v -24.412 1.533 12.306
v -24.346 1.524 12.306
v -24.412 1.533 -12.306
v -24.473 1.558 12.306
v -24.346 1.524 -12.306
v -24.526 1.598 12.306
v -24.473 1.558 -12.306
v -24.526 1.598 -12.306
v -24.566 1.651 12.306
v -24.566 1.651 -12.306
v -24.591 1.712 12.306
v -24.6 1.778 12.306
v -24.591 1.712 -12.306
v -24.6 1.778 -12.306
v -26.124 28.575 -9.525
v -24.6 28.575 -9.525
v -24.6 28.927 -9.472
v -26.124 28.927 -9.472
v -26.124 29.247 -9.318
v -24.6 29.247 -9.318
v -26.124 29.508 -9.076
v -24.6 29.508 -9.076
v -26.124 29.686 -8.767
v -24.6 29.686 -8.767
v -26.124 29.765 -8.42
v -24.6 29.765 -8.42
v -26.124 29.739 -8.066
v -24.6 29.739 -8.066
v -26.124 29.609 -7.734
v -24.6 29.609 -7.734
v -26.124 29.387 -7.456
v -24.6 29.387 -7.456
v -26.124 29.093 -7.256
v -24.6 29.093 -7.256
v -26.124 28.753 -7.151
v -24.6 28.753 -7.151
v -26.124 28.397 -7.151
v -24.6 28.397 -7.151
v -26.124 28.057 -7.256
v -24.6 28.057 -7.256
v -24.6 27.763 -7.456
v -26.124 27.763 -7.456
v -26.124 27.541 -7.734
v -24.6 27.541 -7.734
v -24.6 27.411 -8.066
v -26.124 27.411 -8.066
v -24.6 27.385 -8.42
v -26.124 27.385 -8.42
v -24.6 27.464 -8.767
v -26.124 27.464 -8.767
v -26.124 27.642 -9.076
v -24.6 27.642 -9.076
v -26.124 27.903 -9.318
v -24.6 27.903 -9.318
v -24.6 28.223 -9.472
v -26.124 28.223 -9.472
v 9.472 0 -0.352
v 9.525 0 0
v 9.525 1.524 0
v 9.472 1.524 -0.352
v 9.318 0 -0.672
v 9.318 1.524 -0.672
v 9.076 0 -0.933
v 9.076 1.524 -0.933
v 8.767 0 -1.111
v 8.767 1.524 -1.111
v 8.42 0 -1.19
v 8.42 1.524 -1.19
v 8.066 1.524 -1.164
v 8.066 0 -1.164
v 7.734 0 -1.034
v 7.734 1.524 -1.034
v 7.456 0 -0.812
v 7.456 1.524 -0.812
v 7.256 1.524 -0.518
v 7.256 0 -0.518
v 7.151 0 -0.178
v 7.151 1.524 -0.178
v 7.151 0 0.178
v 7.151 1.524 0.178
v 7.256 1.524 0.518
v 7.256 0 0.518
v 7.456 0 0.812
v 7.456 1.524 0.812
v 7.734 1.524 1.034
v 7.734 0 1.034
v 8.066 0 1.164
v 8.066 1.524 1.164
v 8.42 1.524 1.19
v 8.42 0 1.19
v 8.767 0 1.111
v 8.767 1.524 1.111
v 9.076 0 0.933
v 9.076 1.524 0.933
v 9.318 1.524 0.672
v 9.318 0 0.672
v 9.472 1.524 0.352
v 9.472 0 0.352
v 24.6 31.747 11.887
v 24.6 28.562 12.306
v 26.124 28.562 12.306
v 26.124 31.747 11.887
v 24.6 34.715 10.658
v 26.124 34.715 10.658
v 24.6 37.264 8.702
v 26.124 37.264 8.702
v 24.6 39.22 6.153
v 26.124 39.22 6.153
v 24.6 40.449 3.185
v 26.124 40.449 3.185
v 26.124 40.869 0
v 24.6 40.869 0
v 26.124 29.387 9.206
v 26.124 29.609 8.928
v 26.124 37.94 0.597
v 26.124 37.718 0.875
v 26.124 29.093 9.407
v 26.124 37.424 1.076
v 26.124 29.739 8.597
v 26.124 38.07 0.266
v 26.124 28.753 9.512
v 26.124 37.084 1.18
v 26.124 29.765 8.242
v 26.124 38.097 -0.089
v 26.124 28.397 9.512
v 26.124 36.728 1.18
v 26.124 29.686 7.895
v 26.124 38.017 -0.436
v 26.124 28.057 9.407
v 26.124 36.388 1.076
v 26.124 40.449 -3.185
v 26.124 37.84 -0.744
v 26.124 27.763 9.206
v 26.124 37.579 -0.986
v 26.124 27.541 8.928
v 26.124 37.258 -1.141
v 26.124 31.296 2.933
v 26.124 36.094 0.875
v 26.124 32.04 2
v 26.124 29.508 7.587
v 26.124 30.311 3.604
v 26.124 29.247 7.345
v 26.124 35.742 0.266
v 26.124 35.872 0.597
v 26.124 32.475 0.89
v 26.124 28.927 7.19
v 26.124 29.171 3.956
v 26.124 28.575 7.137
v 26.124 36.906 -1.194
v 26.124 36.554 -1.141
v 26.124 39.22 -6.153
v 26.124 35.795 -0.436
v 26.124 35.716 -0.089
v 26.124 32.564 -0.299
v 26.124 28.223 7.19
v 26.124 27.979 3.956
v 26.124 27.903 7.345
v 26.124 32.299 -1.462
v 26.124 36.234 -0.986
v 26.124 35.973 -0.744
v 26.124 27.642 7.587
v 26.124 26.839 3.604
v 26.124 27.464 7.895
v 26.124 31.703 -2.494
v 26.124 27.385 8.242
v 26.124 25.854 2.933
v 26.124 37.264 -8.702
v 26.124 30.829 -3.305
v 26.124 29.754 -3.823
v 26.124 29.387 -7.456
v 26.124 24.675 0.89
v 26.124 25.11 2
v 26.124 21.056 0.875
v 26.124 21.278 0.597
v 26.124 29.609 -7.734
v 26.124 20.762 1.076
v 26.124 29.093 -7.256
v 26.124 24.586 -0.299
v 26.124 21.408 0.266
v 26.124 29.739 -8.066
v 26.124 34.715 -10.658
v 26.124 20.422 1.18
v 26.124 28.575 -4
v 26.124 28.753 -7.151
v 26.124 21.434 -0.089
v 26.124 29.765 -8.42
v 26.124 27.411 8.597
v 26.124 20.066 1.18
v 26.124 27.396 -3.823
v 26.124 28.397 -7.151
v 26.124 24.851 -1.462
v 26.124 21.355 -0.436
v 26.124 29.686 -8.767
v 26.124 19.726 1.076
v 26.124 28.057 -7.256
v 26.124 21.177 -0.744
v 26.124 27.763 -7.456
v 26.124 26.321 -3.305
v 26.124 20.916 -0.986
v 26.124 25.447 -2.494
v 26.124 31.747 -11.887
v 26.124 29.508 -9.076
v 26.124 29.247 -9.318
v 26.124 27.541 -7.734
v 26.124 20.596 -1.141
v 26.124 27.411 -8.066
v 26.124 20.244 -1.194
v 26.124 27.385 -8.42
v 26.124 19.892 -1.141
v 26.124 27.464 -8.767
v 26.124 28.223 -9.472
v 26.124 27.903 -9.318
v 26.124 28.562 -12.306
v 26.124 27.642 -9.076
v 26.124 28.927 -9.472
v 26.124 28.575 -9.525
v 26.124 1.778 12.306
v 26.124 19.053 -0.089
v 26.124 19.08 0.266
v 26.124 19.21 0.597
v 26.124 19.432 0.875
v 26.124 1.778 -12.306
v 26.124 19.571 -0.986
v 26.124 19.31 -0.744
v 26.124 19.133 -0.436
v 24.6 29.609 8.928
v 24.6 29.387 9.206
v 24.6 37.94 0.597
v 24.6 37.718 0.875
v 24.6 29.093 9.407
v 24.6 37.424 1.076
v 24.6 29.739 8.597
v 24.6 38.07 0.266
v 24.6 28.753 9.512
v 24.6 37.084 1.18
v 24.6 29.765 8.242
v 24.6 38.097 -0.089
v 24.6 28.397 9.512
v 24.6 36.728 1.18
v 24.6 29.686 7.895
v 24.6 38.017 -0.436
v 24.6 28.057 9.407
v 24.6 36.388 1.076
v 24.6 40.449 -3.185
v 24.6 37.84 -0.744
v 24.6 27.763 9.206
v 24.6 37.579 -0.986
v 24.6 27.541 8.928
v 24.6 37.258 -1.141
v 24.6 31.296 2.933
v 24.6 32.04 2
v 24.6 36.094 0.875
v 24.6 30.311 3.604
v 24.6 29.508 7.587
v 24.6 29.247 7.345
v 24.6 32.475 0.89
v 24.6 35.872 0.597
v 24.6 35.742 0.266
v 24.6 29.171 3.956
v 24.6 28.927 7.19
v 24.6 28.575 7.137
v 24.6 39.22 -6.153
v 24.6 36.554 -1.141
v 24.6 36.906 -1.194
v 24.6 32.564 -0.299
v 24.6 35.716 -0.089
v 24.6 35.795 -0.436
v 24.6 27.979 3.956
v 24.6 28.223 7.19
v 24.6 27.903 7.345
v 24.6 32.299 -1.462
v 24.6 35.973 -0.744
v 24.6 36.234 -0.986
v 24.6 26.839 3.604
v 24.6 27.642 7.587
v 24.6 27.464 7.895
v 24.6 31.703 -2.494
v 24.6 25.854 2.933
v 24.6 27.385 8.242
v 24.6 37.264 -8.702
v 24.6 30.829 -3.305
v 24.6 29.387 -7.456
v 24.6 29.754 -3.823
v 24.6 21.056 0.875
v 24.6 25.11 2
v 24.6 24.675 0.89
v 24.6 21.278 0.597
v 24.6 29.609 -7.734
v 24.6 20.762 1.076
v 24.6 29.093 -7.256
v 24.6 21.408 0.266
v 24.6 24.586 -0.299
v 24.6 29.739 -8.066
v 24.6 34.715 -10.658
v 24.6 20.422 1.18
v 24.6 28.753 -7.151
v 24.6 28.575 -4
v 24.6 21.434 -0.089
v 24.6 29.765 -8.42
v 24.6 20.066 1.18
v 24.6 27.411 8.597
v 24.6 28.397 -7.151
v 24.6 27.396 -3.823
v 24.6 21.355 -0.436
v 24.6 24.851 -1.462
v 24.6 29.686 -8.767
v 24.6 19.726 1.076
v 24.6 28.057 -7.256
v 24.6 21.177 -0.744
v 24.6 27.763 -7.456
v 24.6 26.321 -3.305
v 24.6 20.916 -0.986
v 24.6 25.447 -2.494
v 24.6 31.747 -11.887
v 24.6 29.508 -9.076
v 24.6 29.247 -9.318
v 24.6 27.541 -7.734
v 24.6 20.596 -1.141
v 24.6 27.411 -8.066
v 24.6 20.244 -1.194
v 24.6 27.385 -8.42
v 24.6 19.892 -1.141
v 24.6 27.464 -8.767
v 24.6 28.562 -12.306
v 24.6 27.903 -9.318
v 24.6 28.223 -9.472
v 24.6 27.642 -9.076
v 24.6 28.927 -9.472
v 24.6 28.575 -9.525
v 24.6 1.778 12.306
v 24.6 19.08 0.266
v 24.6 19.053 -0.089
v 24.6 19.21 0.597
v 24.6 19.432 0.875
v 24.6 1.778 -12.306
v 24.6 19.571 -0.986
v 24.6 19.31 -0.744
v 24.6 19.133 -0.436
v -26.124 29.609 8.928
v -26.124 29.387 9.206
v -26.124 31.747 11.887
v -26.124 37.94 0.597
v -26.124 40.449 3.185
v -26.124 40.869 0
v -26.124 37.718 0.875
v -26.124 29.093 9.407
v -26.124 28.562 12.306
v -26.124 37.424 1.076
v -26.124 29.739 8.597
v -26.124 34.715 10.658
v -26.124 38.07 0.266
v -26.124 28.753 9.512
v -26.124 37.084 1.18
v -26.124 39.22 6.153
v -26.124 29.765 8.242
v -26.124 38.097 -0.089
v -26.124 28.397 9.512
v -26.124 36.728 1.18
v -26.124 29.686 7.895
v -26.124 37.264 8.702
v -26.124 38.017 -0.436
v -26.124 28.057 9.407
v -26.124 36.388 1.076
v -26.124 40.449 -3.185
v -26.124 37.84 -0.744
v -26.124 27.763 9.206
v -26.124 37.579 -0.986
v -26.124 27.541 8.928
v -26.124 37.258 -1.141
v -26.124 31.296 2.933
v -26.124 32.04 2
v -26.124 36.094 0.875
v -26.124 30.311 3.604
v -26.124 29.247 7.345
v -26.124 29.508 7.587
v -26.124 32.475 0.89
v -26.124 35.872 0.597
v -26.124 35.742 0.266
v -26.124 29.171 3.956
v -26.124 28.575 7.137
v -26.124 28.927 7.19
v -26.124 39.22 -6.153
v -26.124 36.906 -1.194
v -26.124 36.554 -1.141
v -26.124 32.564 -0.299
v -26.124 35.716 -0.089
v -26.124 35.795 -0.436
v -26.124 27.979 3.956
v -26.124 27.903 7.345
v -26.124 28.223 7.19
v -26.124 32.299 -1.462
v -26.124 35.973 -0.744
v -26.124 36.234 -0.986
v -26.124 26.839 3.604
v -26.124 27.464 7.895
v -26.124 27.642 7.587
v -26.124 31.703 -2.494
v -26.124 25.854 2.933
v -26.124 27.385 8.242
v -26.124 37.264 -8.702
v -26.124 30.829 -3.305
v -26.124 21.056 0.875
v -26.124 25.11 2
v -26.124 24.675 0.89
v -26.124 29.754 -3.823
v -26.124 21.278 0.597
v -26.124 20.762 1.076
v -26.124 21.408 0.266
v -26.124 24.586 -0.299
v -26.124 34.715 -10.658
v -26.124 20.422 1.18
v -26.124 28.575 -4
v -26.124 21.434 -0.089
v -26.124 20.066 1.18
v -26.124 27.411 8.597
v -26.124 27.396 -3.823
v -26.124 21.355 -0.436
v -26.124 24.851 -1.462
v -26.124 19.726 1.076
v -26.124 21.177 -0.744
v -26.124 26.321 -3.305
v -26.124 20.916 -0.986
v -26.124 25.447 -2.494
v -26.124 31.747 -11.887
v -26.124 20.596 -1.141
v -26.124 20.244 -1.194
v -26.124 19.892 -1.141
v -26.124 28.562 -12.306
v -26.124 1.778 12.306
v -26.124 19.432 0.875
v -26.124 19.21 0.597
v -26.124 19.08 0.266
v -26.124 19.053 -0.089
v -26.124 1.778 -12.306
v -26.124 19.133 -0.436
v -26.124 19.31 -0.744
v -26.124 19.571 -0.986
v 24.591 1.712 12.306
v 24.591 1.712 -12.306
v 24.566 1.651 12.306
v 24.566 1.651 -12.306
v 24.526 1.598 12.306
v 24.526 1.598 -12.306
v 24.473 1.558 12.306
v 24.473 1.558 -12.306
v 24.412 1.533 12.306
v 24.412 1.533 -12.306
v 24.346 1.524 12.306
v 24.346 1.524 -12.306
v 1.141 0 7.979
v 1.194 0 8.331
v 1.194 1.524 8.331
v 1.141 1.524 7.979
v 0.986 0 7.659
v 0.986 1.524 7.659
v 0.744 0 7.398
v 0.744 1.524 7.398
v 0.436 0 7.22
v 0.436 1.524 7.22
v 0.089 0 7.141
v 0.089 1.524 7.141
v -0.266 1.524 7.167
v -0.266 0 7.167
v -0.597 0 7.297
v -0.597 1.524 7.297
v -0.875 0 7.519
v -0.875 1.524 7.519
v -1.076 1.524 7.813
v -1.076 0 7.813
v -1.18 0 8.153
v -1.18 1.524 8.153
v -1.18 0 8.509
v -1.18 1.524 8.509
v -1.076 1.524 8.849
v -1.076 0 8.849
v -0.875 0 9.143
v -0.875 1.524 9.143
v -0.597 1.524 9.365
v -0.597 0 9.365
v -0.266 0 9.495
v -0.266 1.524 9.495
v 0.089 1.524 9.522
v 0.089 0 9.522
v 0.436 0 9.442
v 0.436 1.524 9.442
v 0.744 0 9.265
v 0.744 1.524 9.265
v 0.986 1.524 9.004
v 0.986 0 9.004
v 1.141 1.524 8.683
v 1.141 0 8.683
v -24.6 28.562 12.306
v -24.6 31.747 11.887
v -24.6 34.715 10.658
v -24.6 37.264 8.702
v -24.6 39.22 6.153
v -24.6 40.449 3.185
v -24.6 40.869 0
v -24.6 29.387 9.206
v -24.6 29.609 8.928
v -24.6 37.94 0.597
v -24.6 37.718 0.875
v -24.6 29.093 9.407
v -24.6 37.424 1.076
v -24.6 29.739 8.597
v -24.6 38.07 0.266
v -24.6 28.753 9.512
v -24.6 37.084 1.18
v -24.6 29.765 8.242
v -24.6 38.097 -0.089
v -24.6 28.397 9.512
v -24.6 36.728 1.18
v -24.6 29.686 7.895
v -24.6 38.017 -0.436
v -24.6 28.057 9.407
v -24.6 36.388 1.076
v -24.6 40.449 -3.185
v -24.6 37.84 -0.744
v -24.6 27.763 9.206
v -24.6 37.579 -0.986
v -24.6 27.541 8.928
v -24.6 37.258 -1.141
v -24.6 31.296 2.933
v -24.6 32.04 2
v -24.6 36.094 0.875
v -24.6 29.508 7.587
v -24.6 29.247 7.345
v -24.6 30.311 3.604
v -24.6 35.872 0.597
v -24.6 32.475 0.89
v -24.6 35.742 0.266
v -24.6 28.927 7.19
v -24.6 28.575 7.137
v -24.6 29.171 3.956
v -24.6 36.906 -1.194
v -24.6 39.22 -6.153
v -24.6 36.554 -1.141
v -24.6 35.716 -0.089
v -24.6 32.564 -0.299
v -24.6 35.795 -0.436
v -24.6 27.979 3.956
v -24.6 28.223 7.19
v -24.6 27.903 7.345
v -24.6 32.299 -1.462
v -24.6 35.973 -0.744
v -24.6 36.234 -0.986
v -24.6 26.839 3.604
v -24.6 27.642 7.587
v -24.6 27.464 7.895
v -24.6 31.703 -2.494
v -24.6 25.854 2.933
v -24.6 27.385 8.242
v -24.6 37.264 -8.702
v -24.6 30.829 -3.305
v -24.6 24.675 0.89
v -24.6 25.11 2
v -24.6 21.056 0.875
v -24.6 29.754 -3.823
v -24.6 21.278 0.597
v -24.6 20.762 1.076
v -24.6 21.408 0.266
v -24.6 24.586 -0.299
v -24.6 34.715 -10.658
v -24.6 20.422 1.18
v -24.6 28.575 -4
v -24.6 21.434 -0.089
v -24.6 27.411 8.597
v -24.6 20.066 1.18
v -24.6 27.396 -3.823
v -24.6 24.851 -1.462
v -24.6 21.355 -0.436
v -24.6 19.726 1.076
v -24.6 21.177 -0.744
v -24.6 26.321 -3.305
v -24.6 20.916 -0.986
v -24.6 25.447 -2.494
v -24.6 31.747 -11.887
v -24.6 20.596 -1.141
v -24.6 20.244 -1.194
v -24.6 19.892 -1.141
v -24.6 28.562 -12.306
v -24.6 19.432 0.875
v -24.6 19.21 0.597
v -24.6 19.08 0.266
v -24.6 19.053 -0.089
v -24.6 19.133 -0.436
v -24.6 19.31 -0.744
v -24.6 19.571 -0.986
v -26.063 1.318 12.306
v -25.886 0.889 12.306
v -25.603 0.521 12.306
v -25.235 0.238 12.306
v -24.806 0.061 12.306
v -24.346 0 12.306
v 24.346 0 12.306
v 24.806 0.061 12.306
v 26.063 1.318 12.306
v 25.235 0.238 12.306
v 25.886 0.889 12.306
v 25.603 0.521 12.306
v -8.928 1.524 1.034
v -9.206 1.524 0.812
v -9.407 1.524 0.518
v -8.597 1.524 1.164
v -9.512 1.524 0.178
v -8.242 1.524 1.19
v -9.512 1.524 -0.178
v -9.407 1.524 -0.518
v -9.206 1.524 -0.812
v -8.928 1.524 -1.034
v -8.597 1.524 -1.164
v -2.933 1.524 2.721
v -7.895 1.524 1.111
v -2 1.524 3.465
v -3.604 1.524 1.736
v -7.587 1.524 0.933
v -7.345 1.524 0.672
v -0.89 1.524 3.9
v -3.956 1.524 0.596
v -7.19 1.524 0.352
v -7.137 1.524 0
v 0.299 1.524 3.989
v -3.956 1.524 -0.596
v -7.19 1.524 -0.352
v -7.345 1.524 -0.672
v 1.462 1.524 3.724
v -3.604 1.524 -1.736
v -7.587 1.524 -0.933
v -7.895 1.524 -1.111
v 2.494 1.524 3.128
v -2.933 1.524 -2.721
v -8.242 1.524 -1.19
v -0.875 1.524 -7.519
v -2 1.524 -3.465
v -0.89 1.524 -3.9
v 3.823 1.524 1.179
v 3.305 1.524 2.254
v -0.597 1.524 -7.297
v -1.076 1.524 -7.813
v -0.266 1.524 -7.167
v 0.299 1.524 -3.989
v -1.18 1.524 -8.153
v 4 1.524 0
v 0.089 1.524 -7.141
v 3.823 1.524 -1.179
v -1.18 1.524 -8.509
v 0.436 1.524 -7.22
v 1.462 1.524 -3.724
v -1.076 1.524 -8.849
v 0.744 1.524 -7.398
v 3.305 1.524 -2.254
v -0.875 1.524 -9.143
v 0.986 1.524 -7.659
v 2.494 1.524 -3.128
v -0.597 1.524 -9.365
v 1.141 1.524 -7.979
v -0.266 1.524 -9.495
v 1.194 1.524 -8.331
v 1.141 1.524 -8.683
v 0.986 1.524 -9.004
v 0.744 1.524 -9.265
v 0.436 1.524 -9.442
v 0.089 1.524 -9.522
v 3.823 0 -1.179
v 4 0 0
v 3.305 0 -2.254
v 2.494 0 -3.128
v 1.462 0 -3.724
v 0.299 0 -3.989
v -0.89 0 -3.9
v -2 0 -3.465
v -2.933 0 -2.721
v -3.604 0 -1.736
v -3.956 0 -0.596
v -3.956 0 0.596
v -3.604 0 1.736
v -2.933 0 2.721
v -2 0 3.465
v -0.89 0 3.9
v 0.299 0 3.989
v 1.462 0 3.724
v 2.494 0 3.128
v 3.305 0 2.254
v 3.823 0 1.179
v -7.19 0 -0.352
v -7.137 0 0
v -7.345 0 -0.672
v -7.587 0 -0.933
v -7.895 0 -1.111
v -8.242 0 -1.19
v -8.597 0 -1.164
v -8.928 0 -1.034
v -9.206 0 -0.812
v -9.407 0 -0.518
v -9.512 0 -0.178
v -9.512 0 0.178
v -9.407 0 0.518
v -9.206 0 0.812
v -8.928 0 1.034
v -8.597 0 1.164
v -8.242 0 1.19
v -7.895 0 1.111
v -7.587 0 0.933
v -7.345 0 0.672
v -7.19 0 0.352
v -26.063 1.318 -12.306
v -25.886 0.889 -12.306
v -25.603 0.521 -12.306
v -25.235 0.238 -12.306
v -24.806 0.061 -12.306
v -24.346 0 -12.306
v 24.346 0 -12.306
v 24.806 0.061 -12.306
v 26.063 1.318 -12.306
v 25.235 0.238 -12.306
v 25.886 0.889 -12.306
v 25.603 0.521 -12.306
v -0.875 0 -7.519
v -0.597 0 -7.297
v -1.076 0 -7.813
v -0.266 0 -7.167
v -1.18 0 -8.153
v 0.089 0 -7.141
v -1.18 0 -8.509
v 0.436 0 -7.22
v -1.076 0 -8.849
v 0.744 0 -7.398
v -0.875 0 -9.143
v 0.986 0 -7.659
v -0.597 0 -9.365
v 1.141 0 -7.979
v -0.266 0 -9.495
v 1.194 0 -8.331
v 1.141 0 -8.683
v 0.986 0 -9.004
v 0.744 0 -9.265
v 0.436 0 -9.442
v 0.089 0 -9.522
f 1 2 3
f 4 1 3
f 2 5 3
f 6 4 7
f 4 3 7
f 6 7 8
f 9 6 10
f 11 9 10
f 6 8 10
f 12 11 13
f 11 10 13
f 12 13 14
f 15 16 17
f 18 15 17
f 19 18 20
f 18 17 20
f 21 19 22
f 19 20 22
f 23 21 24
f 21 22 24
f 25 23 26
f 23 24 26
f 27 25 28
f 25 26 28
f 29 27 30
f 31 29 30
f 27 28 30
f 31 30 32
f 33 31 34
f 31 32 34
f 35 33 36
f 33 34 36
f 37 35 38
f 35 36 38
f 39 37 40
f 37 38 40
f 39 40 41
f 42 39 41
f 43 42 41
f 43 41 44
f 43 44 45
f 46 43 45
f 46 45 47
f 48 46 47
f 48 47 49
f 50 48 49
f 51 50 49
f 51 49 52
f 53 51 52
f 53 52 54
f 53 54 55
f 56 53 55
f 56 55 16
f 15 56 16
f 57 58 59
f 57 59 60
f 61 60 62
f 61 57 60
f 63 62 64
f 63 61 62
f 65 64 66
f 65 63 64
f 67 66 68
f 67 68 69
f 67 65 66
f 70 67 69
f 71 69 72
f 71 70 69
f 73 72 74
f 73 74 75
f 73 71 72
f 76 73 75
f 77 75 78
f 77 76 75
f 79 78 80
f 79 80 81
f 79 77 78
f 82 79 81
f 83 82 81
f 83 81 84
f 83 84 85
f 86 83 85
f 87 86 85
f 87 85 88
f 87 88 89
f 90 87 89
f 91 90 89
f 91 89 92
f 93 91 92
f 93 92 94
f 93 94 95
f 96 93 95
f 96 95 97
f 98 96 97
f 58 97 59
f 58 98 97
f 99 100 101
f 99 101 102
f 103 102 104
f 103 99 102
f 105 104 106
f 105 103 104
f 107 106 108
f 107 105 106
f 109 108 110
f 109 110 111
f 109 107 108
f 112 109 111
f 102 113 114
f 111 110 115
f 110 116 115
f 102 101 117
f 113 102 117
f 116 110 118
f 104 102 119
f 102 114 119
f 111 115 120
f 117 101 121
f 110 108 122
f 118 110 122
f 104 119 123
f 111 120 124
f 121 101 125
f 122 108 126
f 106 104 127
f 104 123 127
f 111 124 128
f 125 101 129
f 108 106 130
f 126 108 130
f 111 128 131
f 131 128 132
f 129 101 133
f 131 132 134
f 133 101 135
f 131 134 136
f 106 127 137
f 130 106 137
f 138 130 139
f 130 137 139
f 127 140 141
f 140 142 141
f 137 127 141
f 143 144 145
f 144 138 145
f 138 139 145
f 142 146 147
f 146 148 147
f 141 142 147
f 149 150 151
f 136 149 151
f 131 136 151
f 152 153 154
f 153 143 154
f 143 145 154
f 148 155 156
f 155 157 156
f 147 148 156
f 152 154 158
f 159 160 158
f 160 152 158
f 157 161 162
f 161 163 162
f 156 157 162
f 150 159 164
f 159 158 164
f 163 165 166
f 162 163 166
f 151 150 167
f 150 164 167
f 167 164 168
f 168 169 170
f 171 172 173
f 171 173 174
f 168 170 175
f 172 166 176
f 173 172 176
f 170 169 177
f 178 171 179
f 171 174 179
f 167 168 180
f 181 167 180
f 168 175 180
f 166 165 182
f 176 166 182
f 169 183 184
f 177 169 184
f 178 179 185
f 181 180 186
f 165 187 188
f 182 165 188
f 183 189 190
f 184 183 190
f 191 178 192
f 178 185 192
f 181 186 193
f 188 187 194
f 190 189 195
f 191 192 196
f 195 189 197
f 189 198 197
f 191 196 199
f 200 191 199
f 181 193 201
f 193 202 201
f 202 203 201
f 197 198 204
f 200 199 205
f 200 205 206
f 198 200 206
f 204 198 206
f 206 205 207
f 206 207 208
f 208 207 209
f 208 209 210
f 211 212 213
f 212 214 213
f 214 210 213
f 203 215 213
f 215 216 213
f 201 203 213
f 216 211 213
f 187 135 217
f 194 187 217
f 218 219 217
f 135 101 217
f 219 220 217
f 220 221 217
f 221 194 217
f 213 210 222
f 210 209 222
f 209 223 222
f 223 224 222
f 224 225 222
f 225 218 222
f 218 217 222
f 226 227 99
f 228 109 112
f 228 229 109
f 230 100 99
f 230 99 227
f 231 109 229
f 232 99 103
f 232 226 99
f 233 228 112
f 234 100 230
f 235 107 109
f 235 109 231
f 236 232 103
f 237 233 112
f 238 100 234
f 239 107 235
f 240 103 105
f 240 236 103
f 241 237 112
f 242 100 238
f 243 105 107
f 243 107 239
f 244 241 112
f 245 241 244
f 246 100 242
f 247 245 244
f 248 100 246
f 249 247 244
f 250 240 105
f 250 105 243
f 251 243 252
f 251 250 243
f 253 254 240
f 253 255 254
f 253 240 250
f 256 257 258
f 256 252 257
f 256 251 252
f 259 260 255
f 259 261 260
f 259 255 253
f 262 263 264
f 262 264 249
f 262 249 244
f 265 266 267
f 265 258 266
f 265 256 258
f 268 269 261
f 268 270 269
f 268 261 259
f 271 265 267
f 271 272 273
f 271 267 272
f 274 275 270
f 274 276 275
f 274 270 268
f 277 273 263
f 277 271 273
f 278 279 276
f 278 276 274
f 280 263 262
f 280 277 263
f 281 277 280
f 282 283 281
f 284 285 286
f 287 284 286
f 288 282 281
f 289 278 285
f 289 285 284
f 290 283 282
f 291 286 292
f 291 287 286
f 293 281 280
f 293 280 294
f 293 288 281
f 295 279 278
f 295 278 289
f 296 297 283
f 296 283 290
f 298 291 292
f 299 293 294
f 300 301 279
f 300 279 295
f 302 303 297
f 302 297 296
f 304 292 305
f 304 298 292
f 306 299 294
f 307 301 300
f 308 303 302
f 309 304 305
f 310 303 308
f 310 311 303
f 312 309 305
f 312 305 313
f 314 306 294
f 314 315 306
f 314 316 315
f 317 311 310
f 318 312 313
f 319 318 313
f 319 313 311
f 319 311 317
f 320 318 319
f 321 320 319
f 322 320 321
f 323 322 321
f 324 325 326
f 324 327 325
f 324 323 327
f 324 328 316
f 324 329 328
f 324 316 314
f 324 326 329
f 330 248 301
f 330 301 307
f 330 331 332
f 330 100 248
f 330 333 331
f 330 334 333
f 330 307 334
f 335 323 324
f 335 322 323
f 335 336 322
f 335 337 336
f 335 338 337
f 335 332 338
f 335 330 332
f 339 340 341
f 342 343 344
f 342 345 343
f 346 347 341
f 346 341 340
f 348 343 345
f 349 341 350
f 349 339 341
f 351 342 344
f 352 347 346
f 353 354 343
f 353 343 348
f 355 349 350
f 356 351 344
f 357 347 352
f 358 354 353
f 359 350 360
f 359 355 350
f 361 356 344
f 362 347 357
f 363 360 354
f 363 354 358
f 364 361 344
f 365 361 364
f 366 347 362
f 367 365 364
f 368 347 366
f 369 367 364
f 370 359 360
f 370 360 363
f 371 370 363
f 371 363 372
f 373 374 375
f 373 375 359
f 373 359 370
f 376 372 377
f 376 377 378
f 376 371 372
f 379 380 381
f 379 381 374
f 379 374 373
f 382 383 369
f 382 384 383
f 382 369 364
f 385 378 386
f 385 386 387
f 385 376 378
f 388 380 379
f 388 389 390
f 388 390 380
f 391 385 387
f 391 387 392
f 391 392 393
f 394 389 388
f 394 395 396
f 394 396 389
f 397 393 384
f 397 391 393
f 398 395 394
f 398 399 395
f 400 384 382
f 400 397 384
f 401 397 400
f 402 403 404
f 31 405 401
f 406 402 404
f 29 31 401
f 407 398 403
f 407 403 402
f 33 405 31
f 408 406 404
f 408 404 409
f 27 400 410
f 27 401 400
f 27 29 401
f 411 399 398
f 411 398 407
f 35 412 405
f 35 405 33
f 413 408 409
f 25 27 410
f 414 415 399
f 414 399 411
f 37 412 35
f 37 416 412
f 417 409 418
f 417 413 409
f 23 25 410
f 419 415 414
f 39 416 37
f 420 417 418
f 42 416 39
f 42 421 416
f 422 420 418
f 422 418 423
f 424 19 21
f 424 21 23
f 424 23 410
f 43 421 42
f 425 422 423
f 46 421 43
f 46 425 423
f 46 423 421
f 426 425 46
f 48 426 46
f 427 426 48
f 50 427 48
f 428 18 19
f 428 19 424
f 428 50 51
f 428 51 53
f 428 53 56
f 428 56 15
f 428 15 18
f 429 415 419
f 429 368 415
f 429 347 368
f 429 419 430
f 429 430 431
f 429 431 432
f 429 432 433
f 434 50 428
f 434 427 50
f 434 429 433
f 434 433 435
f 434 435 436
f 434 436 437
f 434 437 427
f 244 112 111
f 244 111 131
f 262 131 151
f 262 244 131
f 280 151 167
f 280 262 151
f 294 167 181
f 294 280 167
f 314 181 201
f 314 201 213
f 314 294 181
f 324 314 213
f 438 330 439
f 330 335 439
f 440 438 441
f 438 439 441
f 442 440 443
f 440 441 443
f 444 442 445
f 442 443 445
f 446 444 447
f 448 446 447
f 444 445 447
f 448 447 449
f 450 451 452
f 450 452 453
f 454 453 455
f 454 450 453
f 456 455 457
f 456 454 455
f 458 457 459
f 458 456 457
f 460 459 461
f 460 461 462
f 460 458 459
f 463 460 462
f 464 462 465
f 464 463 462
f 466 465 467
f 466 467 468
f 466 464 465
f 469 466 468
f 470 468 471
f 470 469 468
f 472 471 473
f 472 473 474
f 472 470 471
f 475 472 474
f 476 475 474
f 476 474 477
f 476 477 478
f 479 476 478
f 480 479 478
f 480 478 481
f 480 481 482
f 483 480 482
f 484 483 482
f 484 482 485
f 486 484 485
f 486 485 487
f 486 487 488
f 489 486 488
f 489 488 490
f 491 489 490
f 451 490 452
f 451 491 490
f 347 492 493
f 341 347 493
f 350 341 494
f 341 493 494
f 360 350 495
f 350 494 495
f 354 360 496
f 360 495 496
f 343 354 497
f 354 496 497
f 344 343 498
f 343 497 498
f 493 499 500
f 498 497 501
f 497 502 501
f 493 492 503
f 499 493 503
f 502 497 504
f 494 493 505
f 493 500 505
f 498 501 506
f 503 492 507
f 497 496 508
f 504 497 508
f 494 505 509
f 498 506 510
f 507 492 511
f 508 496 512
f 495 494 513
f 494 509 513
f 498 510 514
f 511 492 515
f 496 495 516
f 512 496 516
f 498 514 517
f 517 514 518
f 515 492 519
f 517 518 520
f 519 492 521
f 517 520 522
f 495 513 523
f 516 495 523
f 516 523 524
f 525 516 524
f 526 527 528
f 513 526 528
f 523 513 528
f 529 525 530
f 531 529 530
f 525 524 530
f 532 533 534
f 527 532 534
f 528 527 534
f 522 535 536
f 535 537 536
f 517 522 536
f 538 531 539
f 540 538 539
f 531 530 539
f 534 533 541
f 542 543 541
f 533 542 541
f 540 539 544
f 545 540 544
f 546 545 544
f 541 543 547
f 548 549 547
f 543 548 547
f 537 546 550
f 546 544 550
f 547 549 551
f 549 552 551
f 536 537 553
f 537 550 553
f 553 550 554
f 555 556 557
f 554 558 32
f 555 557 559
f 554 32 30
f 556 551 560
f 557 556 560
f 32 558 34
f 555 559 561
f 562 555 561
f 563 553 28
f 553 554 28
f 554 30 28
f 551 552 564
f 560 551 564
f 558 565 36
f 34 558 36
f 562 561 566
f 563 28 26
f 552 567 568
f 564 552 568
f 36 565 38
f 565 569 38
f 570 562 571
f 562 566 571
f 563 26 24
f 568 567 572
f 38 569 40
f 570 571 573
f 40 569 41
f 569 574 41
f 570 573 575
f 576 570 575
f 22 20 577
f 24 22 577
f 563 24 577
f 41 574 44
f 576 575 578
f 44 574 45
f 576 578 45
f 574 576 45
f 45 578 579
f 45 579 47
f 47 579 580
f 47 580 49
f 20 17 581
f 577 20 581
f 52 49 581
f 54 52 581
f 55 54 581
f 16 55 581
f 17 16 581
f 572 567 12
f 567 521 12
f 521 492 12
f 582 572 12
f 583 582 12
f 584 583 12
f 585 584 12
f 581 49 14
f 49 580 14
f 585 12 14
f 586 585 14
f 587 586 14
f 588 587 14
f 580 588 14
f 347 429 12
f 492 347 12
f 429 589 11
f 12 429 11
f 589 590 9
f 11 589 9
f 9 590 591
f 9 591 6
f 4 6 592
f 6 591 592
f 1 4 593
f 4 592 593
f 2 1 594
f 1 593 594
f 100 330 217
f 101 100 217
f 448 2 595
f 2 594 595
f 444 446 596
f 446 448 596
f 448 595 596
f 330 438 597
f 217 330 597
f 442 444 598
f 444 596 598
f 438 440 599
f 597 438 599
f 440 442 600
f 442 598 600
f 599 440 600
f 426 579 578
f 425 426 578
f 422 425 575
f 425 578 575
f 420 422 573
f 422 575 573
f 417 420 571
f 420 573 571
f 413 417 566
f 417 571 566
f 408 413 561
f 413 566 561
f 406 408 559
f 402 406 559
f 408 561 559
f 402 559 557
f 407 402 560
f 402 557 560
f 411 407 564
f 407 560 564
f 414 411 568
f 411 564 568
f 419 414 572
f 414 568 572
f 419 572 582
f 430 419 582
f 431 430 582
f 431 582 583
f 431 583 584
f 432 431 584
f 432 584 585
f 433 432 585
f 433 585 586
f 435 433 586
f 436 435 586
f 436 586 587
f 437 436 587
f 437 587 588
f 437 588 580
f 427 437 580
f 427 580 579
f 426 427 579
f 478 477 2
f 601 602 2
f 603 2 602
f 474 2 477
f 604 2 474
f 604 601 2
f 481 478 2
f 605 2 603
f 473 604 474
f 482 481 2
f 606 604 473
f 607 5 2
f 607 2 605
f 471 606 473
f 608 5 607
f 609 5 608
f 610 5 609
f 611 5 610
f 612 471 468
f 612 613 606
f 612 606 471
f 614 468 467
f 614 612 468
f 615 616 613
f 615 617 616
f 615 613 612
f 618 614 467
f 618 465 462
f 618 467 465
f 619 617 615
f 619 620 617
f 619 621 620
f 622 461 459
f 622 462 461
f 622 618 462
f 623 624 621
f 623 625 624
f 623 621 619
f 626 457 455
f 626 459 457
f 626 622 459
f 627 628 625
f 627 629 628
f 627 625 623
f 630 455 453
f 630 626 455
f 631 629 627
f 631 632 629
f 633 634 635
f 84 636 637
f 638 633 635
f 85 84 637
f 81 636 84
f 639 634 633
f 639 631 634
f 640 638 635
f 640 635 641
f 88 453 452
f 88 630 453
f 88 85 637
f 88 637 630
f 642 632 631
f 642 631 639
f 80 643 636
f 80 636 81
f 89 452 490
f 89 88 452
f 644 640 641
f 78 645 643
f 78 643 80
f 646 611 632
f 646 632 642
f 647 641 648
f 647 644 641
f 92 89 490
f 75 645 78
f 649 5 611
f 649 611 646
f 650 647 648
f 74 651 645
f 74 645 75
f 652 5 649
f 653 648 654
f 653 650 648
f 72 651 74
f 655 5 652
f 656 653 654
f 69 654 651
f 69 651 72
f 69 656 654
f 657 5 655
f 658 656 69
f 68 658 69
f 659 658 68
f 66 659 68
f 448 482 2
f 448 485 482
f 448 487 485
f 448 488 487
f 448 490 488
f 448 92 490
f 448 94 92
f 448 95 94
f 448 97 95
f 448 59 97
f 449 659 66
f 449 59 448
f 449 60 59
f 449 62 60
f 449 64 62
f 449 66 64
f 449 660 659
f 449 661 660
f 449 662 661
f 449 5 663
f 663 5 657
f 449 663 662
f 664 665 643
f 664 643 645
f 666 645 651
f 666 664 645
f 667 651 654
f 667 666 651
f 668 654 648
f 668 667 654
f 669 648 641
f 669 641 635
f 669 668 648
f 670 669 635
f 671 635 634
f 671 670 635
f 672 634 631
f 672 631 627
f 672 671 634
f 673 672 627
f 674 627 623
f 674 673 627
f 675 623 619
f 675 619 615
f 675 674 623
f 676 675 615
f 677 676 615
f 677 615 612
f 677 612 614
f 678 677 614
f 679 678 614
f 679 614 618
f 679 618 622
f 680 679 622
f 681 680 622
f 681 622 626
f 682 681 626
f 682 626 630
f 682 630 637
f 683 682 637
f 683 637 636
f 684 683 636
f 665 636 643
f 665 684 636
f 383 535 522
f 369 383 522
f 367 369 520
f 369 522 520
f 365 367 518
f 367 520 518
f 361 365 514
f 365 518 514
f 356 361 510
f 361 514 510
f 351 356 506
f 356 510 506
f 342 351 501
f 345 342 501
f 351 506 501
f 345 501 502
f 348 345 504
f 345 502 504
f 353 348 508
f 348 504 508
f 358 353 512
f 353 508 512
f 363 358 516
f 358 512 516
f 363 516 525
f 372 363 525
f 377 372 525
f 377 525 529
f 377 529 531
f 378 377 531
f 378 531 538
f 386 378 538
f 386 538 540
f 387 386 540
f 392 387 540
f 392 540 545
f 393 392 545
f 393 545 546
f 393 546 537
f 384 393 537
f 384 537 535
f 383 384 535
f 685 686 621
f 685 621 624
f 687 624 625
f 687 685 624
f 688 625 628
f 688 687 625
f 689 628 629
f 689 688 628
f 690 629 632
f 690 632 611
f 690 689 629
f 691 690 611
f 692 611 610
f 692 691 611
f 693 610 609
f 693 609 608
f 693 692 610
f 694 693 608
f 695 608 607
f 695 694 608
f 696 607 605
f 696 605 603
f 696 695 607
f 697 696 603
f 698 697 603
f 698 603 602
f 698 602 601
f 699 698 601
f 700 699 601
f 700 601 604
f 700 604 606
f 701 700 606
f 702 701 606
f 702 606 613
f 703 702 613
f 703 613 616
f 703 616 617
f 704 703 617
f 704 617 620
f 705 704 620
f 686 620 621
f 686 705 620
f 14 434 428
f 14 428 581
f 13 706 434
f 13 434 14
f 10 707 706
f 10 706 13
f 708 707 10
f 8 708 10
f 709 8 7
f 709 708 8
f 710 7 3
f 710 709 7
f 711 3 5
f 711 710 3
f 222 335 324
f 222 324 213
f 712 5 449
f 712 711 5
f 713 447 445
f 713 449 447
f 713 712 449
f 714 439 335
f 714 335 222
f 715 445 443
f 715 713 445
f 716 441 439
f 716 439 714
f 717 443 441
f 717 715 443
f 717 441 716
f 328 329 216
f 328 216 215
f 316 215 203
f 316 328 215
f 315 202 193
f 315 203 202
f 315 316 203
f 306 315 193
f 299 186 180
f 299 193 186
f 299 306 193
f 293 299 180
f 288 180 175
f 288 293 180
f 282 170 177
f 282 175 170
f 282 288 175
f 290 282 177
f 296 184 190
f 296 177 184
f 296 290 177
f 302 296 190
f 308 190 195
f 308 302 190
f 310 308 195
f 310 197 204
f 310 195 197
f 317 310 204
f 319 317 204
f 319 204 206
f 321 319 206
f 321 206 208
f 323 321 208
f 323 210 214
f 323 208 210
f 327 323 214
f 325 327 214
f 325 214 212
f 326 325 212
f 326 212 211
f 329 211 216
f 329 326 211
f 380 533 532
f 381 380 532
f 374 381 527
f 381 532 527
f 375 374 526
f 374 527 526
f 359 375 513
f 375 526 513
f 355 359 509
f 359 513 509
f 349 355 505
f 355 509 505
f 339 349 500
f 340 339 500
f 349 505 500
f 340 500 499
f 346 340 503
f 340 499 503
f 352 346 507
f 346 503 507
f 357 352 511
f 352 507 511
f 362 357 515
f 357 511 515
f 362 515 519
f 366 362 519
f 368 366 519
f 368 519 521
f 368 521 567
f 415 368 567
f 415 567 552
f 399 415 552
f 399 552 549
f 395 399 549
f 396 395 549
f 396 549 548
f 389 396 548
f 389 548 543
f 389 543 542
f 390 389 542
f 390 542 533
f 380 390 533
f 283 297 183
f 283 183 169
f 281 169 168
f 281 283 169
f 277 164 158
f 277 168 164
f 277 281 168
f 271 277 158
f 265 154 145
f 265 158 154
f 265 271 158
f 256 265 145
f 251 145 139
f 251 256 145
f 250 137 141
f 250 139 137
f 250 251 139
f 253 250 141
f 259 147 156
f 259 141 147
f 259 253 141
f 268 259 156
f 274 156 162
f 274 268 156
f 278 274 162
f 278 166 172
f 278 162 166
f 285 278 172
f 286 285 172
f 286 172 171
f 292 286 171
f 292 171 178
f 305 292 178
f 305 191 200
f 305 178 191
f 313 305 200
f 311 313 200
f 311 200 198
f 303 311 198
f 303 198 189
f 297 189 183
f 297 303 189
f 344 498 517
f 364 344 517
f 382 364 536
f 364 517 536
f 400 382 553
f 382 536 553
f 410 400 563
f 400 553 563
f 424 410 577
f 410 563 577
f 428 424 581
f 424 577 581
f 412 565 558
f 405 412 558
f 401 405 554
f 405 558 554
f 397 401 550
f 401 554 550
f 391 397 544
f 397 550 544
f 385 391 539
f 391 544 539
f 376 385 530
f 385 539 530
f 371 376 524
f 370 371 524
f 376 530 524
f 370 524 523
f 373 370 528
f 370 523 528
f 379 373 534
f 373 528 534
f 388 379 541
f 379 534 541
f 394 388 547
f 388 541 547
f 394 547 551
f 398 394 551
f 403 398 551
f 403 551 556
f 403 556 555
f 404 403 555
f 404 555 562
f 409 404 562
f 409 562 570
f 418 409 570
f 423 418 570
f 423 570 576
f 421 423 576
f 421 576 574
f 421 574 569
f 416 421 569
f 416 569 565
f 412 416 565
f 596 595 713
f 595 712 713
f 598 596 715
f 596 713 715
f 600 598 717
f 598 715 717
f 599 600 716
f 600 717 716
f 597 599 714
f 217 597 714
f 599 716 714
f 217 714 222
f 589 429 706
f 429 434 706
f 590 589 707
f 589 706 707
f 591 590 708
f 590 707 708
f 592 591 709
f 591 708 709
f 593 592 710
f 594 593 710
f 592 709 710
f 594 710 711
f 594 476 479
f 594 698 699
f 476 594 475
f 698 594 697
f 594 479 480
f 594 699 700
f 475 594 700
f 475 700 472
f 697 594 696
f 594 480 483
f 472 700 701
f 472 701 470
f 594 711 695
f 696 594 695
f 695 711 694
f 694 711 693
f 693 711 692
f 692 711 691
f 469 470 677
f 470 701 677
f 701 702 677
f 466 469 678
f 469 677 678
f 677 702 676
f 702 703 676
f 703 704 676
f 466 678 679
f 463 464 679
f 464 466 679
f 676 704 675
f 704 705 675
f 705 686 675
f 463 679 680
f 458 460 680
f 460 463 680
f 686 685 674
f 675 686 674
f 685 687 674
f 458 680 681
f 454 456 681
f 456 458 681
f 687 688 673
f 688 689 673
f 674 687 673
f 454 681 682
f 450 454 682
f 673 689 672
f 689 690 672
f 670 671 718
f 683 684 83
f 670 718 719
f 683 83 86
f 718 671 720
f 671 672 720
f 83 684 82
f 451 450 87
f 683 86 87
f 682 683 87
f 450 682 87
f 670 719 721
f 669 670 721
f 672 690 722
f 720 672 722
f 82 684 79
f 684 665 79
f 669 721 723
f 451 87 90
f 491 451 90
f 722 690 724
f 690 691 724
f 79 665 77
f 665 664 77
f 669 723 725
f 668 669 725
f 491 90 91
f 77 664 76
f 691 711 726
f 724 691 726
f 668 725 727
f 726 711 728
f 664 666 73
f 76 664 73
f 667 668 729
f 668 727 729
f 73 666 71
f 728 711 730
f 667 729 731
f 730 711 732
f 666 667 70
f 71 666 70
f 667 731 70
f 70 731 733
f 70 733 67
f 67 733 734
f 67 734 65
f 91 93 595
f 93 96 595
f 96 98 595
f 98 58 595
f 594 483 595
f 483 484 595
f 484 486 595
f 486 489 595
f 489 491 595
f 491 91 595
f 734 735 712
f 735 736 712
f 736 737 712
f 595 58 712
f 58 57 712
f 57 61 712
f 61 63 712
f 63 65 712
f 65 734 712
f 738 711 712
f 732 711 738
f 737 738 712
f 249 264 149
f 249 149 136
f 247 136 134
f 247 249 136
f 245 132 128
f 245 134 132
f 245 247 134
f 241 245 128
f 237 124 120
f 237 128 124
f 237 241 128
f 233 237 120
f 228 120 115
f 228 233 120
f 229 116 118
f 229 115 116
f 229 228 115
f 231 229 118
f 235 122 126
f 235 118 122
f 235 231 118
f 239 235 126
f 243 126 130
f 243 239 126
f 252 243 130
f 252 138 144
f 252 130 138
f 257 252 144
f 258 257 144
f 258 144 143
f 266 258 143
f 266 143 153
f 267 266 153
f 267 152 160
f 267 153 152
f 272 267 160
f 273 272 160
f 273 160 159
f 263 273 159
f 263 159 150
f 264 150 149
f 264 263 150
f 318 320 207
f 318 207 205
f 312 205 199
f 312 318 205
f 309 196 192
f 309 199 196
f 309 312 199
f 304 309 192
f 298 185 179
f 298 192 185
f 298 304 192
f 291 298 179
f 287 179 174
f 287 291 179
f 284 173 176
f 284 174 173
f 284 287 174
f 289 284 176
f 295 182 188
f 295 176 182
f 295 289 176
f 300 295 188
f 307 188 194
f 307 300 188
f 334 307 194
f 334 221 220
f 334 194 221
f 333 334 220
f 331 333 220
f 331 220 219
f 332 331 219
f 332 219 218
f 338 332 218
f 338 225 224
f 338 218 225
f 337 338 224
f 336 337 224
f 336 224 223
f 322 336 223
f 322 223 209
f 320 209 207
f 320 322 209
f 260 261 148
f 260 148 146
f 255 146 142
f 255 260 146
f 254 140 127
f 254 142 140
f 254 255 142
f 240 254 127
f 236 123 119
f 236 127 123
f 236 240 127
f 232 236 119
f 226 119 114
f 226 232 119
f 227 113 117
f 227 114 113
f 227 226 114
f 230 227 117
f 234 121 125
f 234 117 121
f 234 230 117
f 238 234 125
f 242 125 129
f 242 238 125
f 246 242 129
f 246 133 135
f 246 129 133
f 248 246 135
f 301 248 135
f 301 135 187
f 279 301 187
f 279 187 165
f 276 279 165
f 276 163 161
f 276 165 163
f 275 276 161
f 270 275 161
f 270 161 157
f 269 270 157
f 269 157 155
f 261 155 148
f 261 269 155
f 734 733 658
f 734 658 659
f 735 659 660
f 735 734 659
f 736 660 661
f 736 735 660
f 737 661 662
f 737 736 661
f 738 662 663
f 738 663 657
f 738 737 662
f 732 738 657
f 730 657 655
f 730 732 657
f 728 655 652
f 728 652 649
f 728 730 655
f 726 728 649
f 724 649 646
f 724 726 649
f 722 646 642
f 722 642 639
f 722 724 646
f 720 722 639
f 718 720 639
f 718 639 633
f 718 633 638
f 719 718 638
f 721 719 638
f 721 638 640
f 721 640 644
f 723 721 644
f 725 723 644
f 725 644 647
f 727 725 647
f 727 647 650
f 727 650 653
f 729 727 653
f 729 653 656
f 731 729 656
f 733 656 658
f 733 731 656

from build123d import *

# Parameters (mm, degrees)
SKETCH1_W               = 49.1998
SKETCH1_H               = 24.6126
SKETCH1_R               = 1.1938
SKETCH1_R_2             = 4.0005
EXTRUDE1_DEPTH          = 1.524
SKETCH1_3_W             = 1.524
SKETCH1_3_H             = 24.6126
EXTRUDE2_DEPTH          = 40.8686
SKETCH4_R               = 4.0005
SKETCH4_R_2             = 1.1938
CUT_EXTRUDE1_DEPTH      = 40.8686
CUT_EXTRUDE1_DEPTH_BACK = 40.8686
FILLET1_R               = 0.254
FILLET2_R               = 1.778


with BuildPart() as part:
    # Sketch1 → Extrude1 (new body)
    with BuildSketch(Plane(origin=(0, 0, 0), x_dir=(1, 0, 0), z_dir=(0, 1, 0))):
        Rectangle(SKETCH1_W, SKETCH1_H)
        with Locations((-8.3312, 0)):
            Circle(SKETCH1_R, mode=Mode.SUBTRACT)
        with Locations((0, -8.3312)):
            Circle(SKETCH1_R, mode=Mode.SUBTRACT)
        Circle(SKETCH1_R_2, mode=Mode.SUBTRACT)
        with Locations((8.3312, 0)):
            Circle(SKETCH1_R, mode=Mode.SUBTRACT)
        with Locations((0, 8.3312)):
            Circle(SKETCH1_R, mode=Mode.SUBTRACT)
    extrude(amount=EXTRUDE1_DEPTH)

    # Sketch1<3> → Extrude2 (add)
    with BuildSketch(Plane(origin=(0, 0, 0), x_dir=(1, 0, 0), z_dir=(0, 1, 0))):
        with Locations((25.3619, 0)):
            Rectangle(SKETCH1_3_W, SKETCH1_3_H)
        with Locations((-25.3619, 0)):
            Rectangle(SKETCH1_3_W, SKETCH1_3_H)
    extrude(amount=EXTRUDE2_DEPTH)

    # Sketch4 → Cut-Extrude1 (cut, two sides)
    with BuildSketch(Plane(origin=(0, 0, 0), x_dir=(0, 0, -1), z_dir=(1, 0, 0))) as cut_extrude1_sk:
        with BuildLine():
            Line((0, 40.8686), (-12.3063, 40.8686))
            Line((-12.3063, 40.8686), (-12.3063, 28.5623))
            ThreePointArc((-12.3063, 28.5623), (-8.701868181, 37.264168181), (0, 40.8686))
        make_face()
        with BuildLine():
            Line((12.3063, 40.8686), (0, 40.8686))
            ThreePointArc((0, 40.8686), (8.701868181, 37.264168181), (12.3063, 28.5623))
            Line((12.3063, 28.5623), (12.3063, 40.8686))
        make_face()
        with Locations((0, 28.575)):
            Circle(SKETCH4_R)
        with Locations((8.3312, 28.575)):
            Circle(SKETCH4_R_2)
        with Locations((0, 36.9062)):
            Circle(SKETCH4_R_2)
        with Locations((-8.3312, 28.575)):
            Circle(SKETCH4_R_2)
        with Locations((0, 20.2438)):
            Circle(SKETCH4_R_2)
    extrude(amount=CUT_EXTRUDE1_DEPTH, mode=Mode.SUBTRACT)
    extrude(cut_extrude1_sk.sketch, amount=-CUT_EXTRUDE1_DEPTH_BACK, mode=Mode.SUBTRACT)

    # Fillet1
    fillet1_edges = [part.edges().sort_by_distance(p)[0] for p in [
        (-24.5999, 1.524, 0),
        (24.5999, 1.524, 0),
    ]]
    fillet(fillet1_edges, radius=FILLET1_R)

    # Fillet2
    fillet2_edges = [part.edges().sort_by_distance(p)[0] for p in [
        (-26.1239, 0, 0),
        (26.1239, 0, 0),
    ]]
    fillet(fillet2_edges, radius=FILLET2_R)


solid = part.part
